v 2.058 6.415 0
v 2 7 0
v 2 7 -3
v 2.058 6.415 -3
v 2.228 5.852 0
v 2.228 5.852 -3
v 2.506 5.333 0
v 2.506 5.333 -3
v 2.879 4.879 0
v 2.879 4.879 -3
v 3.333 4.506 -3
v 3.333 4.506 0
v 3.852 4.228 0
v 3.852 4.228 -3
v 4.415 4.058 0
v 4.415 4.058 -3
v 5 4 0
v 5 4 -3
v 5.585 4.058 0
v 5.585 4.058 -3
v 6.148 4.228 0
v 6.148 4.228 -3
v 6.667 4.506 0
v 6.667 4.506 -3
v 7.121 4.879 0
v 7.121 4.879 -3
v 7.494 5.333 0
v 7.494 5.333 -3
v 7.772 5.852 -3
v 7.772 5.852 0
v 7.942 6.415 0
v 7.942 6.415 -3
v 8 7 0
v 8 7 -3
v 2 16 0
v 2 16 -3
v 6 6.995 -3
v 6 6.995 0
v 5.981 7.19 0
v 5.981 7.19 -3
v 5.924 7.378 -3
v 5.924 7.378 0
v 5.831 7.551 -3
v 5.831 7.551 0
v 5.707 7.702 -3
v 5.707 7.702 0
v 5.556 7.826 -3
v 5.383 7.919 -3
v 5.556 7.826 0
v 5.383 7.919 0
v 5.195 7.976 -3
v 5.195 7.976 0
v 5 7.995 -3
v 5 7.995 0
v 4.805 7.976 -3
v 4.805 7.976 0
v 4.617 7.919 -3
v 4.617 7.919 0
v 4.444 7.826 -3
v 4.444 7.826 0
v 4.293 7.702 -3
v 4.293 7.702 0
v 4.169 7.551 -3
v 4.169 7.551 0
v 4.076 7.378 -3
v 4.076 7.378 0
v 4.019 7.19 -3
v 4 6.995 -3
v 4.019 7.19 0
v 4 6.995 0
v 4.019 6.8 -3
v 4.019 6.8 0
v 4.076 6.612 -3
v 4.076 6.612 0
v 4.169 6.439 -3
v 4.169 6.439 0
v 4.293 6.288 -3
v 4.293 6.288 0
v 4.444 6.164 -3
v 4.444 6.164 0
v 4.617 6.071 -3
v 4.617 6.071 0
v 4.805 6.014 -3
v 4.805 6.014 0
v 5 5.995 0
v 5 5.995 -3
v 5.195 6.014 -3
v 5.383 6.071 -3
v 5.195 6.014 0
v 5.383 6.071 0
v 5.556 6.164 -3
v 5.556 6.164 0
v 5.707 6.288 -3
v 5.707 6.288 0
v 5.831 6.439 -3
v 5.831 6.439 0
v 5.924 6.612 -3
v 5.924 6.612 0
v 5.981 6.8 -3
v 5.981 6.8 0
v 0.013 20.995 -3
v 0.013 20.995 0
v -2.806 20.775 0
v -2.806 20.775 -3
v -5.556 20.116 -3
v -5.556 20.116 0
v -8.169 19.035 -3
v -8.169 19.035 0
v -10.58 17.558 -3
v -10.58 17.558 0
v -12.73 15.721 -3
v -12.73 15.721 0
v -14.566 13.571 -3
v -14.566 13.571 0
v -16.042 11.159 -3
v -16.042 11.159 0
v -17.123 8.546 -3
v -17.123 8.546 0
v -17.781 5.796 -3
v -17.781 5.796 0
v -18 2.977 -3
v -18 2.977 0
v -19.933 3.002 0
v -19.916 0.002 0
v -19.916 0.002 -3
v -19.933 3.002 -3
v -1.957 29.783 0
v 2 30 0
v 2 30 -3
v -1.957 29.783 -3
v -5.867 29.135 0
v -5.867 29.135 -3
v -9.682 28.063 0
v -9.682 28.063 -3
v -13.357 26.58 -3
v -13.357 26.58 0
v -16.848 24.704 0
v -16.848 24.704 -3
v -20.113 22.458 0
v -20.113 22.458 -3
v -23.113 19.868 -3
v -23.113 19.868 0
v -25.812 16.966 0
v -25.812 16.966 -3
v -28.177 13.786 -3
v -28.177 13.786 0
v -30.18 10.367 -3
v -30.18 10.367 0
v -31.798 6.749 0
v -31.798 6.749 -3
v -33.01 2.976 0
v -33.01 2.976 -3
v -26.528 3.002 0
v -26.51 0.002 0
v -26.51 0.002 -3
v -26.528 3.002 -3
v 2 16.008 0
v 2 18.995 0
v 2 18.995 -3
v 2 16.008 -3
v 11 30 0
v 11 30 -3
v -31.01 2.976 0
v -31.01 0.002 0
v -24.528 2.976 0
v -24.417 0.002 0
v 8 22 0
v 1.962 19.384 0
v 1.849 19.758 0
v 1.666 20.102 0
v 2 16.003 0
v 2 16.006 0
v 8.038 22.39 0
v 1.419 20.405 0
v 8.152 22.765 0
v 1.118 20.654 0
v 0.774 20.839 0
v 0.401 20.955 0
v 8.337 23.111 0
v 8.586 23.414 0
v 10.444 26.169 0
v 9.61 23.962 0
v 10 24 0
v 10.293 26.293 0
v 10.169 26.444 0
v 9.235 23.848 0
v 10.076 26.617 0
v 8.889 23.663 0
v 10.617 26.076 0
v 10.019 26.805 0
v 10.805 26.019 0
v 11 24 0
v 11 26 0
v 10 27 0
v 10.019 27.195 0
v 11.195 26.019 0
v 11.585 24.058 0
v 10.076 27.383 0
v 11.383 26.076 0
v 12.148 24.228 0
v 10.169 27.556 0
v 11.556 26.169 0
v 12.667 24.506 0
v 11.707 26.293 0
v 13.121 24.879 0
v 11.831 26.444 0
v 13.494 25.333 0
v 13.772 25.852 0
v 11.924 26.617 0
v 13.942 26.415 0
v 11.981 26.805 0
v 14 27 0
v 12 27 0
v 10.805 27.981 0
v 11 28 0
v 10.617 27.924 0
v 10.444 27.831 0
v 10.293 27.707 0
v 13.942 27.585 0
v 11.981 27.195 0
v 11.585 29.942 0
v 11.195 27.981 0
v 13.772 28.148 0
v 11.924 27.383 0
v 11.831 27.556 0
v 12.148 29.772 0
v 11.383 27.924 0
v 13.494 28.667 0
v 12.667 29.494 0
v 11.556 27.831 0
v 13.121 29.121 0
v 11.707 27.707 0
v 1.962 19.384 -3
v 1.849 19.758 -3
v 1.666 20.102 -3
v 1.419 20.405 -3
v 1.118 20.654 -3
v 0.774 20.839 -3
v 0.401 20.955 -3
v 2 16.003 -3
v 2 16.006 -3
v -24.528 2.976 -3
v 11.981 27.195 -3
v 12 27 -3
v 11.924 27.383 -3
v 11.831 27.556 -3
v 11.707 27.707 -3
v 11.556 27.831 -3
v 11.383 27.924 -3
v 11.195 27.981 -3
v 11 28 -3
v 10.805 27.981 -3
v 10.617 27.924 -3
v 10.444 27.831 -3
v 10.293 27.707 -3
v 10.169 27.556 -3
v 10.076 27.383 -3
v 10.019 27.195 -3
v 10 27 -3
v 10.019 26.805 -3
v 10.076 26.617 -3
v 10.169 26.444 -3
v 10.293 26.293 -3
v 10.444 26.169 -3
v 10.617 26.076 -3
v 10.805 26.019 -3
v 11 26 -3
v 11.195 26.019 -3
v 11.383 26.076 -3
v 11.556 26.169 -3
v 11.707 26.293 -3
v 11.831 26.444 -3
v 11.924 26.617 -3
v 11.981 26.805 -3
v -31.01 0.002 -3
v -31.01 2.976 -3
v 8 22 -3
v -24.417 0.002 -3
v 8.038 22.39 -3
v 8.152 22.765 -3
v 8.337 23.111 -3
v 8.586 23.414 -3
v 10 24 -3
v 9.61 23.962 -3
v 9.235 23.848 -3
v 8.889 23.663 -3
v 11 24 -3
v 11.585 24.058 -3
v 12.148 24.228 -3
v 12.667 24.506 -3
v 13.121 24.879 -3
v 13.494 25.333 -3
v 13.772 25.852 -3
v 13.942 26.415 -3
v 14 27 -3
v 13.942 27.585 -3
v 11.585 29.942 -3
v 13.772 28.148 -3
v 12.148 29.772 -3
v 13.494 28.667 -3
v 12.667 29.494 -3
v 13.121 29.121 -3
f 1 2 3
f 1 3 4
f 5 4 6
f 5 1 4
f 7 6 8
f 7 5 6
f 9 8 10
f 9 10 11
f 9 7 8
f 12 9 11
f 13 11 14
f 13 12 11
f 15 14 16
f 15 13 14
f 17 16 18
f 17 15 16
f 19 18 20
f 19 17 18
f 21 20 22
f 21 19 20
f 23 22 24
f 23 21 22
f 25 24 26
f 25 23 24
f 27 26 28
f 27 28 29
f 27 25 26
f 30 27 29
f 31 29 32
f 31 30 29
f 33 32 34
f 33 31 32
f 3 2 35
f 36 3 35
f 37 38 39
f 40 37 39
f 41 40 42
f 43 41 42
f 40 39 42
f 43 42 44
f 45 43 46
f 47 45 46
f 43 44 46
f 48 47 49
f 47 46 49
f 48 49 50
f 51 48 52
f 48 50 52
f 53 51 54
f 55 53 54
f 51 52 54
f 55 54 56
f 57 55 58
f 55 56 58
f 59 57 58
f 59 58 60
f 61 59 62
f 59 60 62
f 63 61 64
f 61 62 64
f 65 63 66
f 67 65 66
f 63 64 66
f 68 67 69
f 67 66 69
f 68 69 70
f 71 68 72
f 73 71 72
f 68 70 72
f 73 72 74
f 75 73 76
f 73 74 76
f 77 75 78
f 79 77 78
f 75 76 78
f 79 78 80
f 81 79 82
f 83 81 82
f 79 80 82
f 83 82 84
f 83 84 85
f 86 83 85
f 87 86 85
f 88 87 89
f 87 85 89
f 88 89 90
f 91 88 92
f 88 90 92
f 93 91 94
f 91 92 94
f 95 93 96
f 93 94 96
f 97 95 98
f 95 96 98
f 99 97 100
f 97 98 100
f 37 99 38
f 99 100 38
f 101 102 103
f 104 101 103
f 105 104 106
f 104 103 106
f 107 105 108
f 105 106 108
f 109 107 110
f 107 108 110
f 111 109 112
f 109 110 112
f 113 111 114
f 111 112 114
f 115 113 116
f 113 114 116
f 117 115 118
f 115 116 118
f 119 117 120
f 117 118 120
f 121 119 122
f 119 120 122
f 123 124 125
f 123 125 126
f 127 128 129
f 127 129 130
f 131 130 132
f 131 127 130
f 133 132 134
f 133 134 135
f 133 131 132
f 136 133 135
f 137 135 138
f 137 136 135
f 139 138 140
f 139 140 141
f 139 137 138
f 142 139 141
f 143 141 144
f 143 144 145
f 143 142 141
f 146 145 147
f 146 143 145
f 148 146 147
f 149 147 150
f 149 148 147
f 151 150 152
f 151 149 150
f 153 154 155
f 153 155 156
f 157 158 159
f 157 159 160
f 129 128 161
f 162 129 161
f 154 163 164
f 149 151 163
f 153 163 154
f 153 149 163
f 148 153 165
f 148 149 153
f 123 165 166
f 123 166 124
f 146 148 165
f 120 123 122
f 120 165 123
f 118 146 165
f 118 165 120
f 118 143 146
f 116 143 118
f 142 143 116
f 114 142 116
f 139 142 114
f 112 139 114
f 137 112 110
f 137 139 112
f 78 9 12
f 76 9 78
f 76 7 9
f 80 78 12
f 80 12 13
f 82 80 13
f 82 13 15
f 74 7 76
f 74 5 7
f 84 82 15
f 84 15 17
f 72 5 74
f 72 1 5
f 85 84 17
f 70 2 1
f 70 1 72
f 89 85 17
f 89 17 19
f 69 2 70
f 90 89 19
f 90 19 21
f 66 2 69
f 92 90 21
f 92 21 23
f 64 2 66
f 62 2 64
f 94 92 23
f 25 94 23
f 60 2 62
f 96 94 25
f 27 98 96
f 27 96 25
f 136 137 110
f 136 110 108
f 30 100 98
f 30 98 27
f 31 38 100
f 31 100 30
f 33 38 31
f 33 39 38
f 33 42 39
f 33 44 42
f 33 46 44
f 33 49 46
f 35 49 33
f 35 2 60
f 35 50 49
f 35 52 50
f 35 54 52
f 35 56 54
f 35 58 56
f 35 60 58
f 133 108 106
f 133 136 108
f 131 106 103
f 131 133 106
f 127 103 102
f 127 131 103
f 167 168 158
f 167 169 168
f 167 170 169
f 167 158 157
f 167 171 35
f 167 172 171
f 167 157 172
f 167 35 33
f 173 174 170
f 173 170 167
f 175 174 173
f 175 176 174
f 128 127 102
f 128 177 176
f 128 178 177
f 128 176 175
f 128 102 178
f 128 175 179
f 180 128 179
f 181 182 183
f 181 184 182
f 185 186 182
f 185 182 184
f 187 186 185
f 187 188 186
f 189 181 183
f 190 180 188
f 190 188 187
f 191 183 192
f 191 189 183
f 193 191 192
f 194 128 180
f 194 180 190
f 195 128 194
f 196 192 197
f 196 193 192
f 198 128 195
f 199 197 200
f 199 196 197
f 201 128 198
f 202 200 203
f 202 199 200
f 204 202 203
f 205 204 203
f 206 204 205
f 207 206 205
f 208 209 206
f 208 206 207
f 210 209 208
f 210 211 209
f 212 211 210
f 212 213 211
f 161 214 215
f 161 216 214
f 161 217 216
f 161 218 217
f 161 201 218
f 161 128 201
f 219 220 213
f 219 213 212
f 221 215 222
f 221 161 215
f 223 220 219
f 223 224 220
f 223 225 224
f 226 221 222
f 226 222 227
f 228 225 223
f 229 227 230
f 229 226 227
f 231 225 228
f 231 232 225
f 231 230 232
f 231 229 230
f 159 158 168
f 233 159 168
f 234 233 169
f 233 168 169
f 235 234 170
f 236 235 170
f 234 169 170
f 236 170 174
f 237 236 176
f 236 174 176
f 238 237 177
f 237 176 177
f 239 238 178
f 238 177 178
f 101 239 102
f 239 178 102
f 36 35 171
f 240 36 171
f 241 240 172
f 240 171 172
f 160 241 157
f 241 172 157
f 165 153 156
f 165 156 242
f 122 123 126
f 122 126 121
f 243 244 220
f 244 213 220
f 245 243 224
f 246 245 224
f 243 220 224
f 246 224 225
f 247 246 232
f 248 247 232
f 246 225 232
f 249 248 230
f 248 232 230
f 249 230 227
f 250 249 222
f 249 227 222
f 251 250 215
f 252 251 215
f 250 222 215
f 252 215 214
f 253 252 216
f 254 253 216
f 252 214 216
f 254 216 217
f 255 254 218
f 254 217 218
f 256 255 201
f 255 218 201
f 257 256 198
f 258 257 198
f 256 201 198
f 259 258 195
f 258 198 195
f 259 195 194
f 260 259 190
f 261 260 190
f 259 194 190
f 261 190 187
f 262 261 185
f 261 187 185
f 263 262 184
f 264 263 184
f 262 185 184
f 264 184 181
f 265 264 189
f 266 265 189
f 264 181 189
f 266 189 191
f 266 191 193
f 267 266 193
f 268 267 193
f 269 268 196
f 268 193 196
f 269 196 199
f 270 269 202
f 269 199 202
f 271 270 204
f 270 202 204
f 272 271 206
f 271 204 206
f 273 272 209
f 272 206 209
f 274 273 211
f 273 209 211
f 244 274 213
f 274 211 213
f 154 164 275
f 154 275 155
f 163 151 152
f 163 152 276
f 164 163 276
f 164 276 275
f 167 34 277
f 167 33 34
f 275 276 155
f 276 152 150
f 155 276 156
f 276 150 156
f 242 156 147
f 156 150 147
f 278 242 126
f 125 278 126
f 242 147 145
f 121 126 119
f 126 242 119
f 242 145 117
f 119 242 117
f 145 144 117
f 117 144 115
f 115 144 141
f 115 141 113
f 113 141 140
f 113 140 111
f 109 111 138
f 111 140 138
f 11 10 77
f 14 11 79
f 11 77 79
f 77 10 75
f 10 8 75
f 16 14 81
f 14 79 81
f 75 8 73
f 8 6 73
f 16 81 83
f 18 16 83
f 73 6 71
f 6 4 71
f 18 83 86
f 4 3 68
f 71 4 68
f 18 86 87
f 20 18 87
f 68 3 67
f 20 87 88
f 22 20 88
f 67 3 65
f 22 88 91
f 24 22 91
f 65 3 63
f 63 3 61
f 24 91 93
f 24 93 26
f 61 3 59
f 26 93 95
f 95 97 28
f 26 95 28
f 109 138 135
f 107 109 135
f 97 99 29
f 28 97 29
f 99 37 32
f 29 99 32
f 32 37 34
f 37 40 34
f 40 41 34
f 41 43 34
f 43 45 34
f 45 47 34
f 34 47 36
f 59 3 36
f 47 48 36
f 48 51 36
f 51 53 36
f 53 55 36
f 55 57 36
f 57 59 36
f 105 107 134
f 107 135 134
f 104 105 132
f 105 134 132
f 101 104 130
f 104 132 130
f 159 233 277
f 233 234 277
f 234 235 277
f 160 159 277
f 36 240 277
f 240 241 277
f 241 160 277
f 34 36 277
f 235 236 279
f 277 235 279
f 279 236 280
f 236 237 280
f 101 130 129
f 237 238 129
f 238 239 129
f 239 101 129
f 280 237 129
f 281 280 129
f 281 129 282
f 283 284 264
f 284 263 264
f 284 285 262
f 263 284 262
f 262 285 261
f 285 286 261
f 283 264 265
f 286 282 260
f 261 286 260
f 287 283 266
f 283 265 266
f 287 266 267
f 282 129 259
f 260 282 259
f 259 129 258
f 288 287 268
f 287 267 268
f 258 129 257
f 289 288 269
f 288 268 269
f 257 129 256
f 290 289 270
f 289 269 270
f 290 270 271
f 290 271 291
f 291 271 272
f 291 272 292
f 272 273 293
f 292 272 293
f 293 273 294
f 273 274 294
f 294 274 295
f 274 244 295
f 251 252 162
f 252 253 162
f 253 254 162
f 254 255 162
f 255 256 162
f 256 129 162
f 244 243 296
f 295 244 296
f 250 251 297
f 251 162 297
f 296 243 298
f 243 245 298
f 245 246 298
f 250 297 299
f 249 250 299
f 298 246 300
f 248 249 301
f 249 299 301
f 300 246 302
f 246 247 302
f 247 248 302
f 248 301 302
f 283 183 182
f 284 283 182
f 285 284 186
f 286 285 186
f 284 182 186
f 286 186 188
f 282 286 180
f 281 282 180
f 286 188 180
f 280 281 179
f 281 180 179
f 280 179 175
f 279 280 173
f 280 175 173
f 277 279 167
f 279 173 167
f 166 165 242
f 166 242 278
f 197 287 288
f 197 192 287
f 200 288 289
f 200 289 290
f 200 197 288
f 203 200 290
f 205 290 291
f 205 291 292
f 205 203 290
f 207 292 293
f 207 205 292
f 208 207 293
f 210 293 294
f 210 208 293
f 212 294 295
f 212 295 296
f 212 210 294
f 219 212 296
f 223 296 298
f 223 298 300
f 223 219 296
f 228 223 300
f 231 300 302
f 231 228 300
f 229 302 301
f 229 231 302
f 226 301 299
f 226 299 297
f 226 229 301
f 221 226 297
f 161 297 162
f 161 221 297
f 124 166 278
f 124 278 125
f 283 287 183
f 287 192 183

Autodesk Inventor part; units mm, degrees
ref_plane "YZ Plane" through (0, 0, 0) normal (1, 0, 0) x (0, 1, 0)
ref_plane "XZ Plane" through (0, 0, 0) normal (0, 1, 0) x (-1, 0, 0)
ref_plane "XY Plane" through (0, 0, 0) normal (0, 0, 1) x (1, 0, 0)
sketch "Sketch1" plane through (0, 0, 0) normal (0, 0, 1) x (1, 0, 0)
  arc A0 (0, 18) -> (-18, 0.0024) centre (0, 0) ccw
  line L0 (0, 0) -> (0, -6.19)
  line L1 (0, -6.19) -> (2, -6.19)
  arc A1 (2, 30) -> (-33.6563, 0.0024) centre (2, -6.19) ccw
  line L2 (-33.6563, 0.0024) -> (-18, 0.0024)
  line L3 (3, 0) -> (3, 0)
  line L4 (6, 0) -> (32.7783, 0) construction
  line L5 (-33.6563, 0.0024) -> (-33.6563, 30.0024)
  line L6 (2, 30) -> (11, 30)
  line L7 (2, 30) -> (11, 30) construction
  line L8 (0, 0) -> (0, 3)
  line L9 (3, 3) -> (3, 3)
  line L10 (0, 3) -> (2, 3)
  line L11 (2, 6) -> (2, 16)
  line L12 (5, 3) -> (5, 3)
  line L13 (8, 6) -> (8, 22)
  arc A2 (2, 6) -> (5, 3) centre (5, 6) ccw
  arc A3 (5, 3) -> (8, 6) centre (5, 6) ccw
  arc A4 (2, 16) -> (0, 18) centre (0, 16) ccw
  arc A5 (11, 24) -> (11, 30) centre (11, 27) ccw
  line L14 (11, 24) -> (10, 24)
  arc A6 (10, 24) -> (8, 22) centre (10, 22) ccw
  circle A7 centre (5, 6) radius 1
  circle A8 centre (11, 27) radius 1
  line L15 (-33.6563, 0.0024) -> (-31.6563, 0.0024)
  line L16 (-27.1563, 0.0024) -> (-25.1563, 0.0024)
  point P0 (8, 3)
  point P1 (8, 24)
  point P2 (2, 17.8885)
  point P3 (-20.6563, 0.0024)
  dimension "d0" = 36
  dimension "d1" = 6.19
  dimension "d2" = 2
  dimension "d3" = 72.38
  dimension "d11" = 30
  dimension "d14" = 3
  dimension "d17" = 2
  dimension "d18" = 6
  dimension "d19" = 3
  dimension "d20" = 2
  dimension "d21" = 9
  dimension "d23" = 6
  dimension "d24" = 18
  dimension "d25" = 2
  dimension "d26" = 2
  dimension "d27" = 2
  dimension "d28" = 2
  dimension "d31" = 2
extrude "Extrusion1" add sketch "Sketch1" against normal blind 3
sketch "Sketch2" plane through (0, 0, 0) normal (0, 0, 1) x (1, 0, 0)
  arc A0 (0.0129, 20.9952) -> (-17.9376, 1.4977) centre (-0.0001, 2.9953) ccw
  arc A1 (2, 18.9952) -> (-0.013, 20.9952) centre (-0.0001, 18.9952) ccw
  line L0 (2, 18.9952) -> (2, 16.0083)
  circle A2 centre (5, 6.9952) radius 3 projected
  circle A3 centre (5, 6.9952) radius 1 projected
  line L1 (8, 6) -> (8, 22) projected
  line L2 (-33, 2.9952) -> (-18, 2.9952) projected
  line L3 (-20, -0.0048) -> (-20, 2.9952) projected
  line L4 (-24.5, -0.0048) -> (-20, -0.0048) projected
  line L5 (-24.5, 2.9952) -> (-24.5, -0.0048) projected
  line L6 (-26.5, -0.0048) -> (-26.5, 2.9952) projected
  line L7 (-31, -0.0048) -> (-26.5, -0.0048) projected
  line L8 (-33.6563, 0.0024) -> (-18, 0.0024) projected
  arc A4 (0, 18) -> (-17.9376, 1.4977) centre (0, 0) ccw
  arc A5 (2, 16) -> (0, 18) centre (0, 16) ccw
  line L9 (2, 16) -> (2, 6) projected
  arc A6 (2, 6) -> (8, 6) centre (5, 6) ccw projected
  line L10 (8, 6) -> (8, 22) projected
  arc A7 (8, 22) -> (10, 24) centre (10, 22) ccw projected
  line L11 (10, 24) -> (11, 24) projected
  arc A8 (11, 24) -> (11, 30) centre (11, 27) ccw projected
  line L12 (11, 30) -> (2, 30) projected
  arc A9 (2, 30) -> (-33.6563, 0.0024) centre (2, -6.19) ccw projected
  circle A10 centre (11, 27) radius 1 projected
  circle A11 centre (5, 6) radius 1 projected
  line L13 (-31, 2.9952) -> (-31, -0.0048) projected
extrude "Extrusion2" cut sketch "Sketch2" against normal blind 9.35 contours A1 L0 A5 A4 A0
sketch "Sketch4" plane through (0, 0, 0) normal (0, 0, 1) x (1, 0, 0)
  circle A0 centre (5, 6) radius 1 projected
  point P0 (0, 0)
extrude "Extrusion3" add sketch "Sketch4" against normal blind 3
sketch "Sketch5" plane through (0, 0, 0) normal (0, 0, 1) x (1, 0, 0)
  line L0 (5, 6) -> (5, 6.995) construction
  circle A0 centre (5, 6.995) radius 1
  point P0 (0, 0)
  dimension "d40" = 0.995
  dimension "d41" = 2
extrude "Extrusion4" cut sketch "Sketch5" against normal blind 3
sketch "Sketch6" plane through (0, 0, 0) normal (0, 0, 1) x (1, 0, 0)
  arc A0 (2, 6) -> (8, 6) centre (5, 6) ccw projected
  line L0 (5, 6) -> (5, 7)
  circle A1 centre (5, 7) radius 3
  line L1 (2, 16) -> (2, 6) projected
  line L2 (8, 6) -> (8, 22) projected
  point P0 (0, 0)
  point P1 (8, 7)
  point P2 (2, 7)
  dimension "d44" = 1
  dimension "d45" = 6
extrude "Extrusion5" cut sketch "Sketch6" against normal blind 3 contours L1 A1 L2 A0
sketch "Sketch8" plane through (0, 0, 0) normal (0, 0, 1) x (1, 0, 0)
  arc A0 (2, 30) -> (-33.6563, 0.0024) centre (2, -6.19) ccw projected
  line L0 (-33.01, 2.9759) -> (-31.01, 2.9759)
  line L1 (-31.01, 2.9759) -> (-31.01, -0.0241)
  line L2 (-31.01, -0.0241) -> (-26.5101, 0.0024)
  line L3 (-18, 0.0024) -> (-33.6563, 0.0024) projected
  line L4 (-26.5101, 0.0024) -> (-26.5278, 3.0024)
  line L5 (-26.5278, 3.0024) -> (-24.5279, 2.9759)
  line L6 (-24.5279, 2.9759) -> (-24.4163, -0.022)
  line L7 (-24.4163, -0.022) -> (-19.9163, 0.0024)
  line L8 (-19.9163, 0.0024) -> (-19.9326, 3.0024)
  line L9 (-19.9326, 3.0024) -> (-17.9328, 2.9759)
  arc A1 (2, 30) -> (-33.6563, 0.0024) centre (2, -6.19) ccw projected
  circle A2 centre (11, 27) radius 1 projected
  arc A3 (2, 7) -> (8, 7) centre (5, 7) ccw projected
  line L10 (8, 7) -> (8, 22) projected
  arc A4 (10, 24) -> (8, 22) centre (10, 22) ccw projected
  line L11 (10, 24) -> (11, 24) projected
  arc A5 (11, 24) -> (11, 30) centre (11, 27) ccw projected
  line L12 (11, 30) -> (2, 30) projected
  arc A6 (2, 30) -> (-33.6563, 0.0024) centre (2, -6.19) ccw projected
  line L13 (-33.6563, 0.0024) -> (-18, 0.0024) projected
  arc A7 (-17.9376, 1.4977) -> (-18, 0.0024) centre (0, 0) ccw projected
  arc A8 (0.0129, 20.9952) -> (-17.9376, 1.4977) centre (-0.0001, 2.9953) ccw projected
  arc A9 (2, 18.9952) -> (0.0129, 20.9952) centre (-0.0001, 18.9952) ccw projected
  line L14 (2, 18.9952) -> (2, 16.0083) projected
  arc A10 (2, 16) -> (2, 16.0083) centre (0, 16) ccw projected
  line L15 (2, 16) -> (2, 7) projected
  circle A11 centre (5, 6.995) radius 1 projected
  point P0 (-18, 2.9768)
  point P1 (-31.01, 0.0024)
  point P2 (-24.4172, 0.0024)
  dimension "d48" = 2
  dimension "d49" = 3
  dimension "d50" = 4.5
  dimension "d51" = 3
  dimension "d52" = 2
  dimension "d53" = 3
  dimension "d54" = 4.5
  dimension "d55" = 3
  dimension "d56" = 2
extrude "Extrusion6" cut sketch "Sketch8" against normal blind 3 contours L0 L1 L3 A0 | L4 L5 L6 L3 | L8 L9 A8 A7 L3
properties part number "hinge"
